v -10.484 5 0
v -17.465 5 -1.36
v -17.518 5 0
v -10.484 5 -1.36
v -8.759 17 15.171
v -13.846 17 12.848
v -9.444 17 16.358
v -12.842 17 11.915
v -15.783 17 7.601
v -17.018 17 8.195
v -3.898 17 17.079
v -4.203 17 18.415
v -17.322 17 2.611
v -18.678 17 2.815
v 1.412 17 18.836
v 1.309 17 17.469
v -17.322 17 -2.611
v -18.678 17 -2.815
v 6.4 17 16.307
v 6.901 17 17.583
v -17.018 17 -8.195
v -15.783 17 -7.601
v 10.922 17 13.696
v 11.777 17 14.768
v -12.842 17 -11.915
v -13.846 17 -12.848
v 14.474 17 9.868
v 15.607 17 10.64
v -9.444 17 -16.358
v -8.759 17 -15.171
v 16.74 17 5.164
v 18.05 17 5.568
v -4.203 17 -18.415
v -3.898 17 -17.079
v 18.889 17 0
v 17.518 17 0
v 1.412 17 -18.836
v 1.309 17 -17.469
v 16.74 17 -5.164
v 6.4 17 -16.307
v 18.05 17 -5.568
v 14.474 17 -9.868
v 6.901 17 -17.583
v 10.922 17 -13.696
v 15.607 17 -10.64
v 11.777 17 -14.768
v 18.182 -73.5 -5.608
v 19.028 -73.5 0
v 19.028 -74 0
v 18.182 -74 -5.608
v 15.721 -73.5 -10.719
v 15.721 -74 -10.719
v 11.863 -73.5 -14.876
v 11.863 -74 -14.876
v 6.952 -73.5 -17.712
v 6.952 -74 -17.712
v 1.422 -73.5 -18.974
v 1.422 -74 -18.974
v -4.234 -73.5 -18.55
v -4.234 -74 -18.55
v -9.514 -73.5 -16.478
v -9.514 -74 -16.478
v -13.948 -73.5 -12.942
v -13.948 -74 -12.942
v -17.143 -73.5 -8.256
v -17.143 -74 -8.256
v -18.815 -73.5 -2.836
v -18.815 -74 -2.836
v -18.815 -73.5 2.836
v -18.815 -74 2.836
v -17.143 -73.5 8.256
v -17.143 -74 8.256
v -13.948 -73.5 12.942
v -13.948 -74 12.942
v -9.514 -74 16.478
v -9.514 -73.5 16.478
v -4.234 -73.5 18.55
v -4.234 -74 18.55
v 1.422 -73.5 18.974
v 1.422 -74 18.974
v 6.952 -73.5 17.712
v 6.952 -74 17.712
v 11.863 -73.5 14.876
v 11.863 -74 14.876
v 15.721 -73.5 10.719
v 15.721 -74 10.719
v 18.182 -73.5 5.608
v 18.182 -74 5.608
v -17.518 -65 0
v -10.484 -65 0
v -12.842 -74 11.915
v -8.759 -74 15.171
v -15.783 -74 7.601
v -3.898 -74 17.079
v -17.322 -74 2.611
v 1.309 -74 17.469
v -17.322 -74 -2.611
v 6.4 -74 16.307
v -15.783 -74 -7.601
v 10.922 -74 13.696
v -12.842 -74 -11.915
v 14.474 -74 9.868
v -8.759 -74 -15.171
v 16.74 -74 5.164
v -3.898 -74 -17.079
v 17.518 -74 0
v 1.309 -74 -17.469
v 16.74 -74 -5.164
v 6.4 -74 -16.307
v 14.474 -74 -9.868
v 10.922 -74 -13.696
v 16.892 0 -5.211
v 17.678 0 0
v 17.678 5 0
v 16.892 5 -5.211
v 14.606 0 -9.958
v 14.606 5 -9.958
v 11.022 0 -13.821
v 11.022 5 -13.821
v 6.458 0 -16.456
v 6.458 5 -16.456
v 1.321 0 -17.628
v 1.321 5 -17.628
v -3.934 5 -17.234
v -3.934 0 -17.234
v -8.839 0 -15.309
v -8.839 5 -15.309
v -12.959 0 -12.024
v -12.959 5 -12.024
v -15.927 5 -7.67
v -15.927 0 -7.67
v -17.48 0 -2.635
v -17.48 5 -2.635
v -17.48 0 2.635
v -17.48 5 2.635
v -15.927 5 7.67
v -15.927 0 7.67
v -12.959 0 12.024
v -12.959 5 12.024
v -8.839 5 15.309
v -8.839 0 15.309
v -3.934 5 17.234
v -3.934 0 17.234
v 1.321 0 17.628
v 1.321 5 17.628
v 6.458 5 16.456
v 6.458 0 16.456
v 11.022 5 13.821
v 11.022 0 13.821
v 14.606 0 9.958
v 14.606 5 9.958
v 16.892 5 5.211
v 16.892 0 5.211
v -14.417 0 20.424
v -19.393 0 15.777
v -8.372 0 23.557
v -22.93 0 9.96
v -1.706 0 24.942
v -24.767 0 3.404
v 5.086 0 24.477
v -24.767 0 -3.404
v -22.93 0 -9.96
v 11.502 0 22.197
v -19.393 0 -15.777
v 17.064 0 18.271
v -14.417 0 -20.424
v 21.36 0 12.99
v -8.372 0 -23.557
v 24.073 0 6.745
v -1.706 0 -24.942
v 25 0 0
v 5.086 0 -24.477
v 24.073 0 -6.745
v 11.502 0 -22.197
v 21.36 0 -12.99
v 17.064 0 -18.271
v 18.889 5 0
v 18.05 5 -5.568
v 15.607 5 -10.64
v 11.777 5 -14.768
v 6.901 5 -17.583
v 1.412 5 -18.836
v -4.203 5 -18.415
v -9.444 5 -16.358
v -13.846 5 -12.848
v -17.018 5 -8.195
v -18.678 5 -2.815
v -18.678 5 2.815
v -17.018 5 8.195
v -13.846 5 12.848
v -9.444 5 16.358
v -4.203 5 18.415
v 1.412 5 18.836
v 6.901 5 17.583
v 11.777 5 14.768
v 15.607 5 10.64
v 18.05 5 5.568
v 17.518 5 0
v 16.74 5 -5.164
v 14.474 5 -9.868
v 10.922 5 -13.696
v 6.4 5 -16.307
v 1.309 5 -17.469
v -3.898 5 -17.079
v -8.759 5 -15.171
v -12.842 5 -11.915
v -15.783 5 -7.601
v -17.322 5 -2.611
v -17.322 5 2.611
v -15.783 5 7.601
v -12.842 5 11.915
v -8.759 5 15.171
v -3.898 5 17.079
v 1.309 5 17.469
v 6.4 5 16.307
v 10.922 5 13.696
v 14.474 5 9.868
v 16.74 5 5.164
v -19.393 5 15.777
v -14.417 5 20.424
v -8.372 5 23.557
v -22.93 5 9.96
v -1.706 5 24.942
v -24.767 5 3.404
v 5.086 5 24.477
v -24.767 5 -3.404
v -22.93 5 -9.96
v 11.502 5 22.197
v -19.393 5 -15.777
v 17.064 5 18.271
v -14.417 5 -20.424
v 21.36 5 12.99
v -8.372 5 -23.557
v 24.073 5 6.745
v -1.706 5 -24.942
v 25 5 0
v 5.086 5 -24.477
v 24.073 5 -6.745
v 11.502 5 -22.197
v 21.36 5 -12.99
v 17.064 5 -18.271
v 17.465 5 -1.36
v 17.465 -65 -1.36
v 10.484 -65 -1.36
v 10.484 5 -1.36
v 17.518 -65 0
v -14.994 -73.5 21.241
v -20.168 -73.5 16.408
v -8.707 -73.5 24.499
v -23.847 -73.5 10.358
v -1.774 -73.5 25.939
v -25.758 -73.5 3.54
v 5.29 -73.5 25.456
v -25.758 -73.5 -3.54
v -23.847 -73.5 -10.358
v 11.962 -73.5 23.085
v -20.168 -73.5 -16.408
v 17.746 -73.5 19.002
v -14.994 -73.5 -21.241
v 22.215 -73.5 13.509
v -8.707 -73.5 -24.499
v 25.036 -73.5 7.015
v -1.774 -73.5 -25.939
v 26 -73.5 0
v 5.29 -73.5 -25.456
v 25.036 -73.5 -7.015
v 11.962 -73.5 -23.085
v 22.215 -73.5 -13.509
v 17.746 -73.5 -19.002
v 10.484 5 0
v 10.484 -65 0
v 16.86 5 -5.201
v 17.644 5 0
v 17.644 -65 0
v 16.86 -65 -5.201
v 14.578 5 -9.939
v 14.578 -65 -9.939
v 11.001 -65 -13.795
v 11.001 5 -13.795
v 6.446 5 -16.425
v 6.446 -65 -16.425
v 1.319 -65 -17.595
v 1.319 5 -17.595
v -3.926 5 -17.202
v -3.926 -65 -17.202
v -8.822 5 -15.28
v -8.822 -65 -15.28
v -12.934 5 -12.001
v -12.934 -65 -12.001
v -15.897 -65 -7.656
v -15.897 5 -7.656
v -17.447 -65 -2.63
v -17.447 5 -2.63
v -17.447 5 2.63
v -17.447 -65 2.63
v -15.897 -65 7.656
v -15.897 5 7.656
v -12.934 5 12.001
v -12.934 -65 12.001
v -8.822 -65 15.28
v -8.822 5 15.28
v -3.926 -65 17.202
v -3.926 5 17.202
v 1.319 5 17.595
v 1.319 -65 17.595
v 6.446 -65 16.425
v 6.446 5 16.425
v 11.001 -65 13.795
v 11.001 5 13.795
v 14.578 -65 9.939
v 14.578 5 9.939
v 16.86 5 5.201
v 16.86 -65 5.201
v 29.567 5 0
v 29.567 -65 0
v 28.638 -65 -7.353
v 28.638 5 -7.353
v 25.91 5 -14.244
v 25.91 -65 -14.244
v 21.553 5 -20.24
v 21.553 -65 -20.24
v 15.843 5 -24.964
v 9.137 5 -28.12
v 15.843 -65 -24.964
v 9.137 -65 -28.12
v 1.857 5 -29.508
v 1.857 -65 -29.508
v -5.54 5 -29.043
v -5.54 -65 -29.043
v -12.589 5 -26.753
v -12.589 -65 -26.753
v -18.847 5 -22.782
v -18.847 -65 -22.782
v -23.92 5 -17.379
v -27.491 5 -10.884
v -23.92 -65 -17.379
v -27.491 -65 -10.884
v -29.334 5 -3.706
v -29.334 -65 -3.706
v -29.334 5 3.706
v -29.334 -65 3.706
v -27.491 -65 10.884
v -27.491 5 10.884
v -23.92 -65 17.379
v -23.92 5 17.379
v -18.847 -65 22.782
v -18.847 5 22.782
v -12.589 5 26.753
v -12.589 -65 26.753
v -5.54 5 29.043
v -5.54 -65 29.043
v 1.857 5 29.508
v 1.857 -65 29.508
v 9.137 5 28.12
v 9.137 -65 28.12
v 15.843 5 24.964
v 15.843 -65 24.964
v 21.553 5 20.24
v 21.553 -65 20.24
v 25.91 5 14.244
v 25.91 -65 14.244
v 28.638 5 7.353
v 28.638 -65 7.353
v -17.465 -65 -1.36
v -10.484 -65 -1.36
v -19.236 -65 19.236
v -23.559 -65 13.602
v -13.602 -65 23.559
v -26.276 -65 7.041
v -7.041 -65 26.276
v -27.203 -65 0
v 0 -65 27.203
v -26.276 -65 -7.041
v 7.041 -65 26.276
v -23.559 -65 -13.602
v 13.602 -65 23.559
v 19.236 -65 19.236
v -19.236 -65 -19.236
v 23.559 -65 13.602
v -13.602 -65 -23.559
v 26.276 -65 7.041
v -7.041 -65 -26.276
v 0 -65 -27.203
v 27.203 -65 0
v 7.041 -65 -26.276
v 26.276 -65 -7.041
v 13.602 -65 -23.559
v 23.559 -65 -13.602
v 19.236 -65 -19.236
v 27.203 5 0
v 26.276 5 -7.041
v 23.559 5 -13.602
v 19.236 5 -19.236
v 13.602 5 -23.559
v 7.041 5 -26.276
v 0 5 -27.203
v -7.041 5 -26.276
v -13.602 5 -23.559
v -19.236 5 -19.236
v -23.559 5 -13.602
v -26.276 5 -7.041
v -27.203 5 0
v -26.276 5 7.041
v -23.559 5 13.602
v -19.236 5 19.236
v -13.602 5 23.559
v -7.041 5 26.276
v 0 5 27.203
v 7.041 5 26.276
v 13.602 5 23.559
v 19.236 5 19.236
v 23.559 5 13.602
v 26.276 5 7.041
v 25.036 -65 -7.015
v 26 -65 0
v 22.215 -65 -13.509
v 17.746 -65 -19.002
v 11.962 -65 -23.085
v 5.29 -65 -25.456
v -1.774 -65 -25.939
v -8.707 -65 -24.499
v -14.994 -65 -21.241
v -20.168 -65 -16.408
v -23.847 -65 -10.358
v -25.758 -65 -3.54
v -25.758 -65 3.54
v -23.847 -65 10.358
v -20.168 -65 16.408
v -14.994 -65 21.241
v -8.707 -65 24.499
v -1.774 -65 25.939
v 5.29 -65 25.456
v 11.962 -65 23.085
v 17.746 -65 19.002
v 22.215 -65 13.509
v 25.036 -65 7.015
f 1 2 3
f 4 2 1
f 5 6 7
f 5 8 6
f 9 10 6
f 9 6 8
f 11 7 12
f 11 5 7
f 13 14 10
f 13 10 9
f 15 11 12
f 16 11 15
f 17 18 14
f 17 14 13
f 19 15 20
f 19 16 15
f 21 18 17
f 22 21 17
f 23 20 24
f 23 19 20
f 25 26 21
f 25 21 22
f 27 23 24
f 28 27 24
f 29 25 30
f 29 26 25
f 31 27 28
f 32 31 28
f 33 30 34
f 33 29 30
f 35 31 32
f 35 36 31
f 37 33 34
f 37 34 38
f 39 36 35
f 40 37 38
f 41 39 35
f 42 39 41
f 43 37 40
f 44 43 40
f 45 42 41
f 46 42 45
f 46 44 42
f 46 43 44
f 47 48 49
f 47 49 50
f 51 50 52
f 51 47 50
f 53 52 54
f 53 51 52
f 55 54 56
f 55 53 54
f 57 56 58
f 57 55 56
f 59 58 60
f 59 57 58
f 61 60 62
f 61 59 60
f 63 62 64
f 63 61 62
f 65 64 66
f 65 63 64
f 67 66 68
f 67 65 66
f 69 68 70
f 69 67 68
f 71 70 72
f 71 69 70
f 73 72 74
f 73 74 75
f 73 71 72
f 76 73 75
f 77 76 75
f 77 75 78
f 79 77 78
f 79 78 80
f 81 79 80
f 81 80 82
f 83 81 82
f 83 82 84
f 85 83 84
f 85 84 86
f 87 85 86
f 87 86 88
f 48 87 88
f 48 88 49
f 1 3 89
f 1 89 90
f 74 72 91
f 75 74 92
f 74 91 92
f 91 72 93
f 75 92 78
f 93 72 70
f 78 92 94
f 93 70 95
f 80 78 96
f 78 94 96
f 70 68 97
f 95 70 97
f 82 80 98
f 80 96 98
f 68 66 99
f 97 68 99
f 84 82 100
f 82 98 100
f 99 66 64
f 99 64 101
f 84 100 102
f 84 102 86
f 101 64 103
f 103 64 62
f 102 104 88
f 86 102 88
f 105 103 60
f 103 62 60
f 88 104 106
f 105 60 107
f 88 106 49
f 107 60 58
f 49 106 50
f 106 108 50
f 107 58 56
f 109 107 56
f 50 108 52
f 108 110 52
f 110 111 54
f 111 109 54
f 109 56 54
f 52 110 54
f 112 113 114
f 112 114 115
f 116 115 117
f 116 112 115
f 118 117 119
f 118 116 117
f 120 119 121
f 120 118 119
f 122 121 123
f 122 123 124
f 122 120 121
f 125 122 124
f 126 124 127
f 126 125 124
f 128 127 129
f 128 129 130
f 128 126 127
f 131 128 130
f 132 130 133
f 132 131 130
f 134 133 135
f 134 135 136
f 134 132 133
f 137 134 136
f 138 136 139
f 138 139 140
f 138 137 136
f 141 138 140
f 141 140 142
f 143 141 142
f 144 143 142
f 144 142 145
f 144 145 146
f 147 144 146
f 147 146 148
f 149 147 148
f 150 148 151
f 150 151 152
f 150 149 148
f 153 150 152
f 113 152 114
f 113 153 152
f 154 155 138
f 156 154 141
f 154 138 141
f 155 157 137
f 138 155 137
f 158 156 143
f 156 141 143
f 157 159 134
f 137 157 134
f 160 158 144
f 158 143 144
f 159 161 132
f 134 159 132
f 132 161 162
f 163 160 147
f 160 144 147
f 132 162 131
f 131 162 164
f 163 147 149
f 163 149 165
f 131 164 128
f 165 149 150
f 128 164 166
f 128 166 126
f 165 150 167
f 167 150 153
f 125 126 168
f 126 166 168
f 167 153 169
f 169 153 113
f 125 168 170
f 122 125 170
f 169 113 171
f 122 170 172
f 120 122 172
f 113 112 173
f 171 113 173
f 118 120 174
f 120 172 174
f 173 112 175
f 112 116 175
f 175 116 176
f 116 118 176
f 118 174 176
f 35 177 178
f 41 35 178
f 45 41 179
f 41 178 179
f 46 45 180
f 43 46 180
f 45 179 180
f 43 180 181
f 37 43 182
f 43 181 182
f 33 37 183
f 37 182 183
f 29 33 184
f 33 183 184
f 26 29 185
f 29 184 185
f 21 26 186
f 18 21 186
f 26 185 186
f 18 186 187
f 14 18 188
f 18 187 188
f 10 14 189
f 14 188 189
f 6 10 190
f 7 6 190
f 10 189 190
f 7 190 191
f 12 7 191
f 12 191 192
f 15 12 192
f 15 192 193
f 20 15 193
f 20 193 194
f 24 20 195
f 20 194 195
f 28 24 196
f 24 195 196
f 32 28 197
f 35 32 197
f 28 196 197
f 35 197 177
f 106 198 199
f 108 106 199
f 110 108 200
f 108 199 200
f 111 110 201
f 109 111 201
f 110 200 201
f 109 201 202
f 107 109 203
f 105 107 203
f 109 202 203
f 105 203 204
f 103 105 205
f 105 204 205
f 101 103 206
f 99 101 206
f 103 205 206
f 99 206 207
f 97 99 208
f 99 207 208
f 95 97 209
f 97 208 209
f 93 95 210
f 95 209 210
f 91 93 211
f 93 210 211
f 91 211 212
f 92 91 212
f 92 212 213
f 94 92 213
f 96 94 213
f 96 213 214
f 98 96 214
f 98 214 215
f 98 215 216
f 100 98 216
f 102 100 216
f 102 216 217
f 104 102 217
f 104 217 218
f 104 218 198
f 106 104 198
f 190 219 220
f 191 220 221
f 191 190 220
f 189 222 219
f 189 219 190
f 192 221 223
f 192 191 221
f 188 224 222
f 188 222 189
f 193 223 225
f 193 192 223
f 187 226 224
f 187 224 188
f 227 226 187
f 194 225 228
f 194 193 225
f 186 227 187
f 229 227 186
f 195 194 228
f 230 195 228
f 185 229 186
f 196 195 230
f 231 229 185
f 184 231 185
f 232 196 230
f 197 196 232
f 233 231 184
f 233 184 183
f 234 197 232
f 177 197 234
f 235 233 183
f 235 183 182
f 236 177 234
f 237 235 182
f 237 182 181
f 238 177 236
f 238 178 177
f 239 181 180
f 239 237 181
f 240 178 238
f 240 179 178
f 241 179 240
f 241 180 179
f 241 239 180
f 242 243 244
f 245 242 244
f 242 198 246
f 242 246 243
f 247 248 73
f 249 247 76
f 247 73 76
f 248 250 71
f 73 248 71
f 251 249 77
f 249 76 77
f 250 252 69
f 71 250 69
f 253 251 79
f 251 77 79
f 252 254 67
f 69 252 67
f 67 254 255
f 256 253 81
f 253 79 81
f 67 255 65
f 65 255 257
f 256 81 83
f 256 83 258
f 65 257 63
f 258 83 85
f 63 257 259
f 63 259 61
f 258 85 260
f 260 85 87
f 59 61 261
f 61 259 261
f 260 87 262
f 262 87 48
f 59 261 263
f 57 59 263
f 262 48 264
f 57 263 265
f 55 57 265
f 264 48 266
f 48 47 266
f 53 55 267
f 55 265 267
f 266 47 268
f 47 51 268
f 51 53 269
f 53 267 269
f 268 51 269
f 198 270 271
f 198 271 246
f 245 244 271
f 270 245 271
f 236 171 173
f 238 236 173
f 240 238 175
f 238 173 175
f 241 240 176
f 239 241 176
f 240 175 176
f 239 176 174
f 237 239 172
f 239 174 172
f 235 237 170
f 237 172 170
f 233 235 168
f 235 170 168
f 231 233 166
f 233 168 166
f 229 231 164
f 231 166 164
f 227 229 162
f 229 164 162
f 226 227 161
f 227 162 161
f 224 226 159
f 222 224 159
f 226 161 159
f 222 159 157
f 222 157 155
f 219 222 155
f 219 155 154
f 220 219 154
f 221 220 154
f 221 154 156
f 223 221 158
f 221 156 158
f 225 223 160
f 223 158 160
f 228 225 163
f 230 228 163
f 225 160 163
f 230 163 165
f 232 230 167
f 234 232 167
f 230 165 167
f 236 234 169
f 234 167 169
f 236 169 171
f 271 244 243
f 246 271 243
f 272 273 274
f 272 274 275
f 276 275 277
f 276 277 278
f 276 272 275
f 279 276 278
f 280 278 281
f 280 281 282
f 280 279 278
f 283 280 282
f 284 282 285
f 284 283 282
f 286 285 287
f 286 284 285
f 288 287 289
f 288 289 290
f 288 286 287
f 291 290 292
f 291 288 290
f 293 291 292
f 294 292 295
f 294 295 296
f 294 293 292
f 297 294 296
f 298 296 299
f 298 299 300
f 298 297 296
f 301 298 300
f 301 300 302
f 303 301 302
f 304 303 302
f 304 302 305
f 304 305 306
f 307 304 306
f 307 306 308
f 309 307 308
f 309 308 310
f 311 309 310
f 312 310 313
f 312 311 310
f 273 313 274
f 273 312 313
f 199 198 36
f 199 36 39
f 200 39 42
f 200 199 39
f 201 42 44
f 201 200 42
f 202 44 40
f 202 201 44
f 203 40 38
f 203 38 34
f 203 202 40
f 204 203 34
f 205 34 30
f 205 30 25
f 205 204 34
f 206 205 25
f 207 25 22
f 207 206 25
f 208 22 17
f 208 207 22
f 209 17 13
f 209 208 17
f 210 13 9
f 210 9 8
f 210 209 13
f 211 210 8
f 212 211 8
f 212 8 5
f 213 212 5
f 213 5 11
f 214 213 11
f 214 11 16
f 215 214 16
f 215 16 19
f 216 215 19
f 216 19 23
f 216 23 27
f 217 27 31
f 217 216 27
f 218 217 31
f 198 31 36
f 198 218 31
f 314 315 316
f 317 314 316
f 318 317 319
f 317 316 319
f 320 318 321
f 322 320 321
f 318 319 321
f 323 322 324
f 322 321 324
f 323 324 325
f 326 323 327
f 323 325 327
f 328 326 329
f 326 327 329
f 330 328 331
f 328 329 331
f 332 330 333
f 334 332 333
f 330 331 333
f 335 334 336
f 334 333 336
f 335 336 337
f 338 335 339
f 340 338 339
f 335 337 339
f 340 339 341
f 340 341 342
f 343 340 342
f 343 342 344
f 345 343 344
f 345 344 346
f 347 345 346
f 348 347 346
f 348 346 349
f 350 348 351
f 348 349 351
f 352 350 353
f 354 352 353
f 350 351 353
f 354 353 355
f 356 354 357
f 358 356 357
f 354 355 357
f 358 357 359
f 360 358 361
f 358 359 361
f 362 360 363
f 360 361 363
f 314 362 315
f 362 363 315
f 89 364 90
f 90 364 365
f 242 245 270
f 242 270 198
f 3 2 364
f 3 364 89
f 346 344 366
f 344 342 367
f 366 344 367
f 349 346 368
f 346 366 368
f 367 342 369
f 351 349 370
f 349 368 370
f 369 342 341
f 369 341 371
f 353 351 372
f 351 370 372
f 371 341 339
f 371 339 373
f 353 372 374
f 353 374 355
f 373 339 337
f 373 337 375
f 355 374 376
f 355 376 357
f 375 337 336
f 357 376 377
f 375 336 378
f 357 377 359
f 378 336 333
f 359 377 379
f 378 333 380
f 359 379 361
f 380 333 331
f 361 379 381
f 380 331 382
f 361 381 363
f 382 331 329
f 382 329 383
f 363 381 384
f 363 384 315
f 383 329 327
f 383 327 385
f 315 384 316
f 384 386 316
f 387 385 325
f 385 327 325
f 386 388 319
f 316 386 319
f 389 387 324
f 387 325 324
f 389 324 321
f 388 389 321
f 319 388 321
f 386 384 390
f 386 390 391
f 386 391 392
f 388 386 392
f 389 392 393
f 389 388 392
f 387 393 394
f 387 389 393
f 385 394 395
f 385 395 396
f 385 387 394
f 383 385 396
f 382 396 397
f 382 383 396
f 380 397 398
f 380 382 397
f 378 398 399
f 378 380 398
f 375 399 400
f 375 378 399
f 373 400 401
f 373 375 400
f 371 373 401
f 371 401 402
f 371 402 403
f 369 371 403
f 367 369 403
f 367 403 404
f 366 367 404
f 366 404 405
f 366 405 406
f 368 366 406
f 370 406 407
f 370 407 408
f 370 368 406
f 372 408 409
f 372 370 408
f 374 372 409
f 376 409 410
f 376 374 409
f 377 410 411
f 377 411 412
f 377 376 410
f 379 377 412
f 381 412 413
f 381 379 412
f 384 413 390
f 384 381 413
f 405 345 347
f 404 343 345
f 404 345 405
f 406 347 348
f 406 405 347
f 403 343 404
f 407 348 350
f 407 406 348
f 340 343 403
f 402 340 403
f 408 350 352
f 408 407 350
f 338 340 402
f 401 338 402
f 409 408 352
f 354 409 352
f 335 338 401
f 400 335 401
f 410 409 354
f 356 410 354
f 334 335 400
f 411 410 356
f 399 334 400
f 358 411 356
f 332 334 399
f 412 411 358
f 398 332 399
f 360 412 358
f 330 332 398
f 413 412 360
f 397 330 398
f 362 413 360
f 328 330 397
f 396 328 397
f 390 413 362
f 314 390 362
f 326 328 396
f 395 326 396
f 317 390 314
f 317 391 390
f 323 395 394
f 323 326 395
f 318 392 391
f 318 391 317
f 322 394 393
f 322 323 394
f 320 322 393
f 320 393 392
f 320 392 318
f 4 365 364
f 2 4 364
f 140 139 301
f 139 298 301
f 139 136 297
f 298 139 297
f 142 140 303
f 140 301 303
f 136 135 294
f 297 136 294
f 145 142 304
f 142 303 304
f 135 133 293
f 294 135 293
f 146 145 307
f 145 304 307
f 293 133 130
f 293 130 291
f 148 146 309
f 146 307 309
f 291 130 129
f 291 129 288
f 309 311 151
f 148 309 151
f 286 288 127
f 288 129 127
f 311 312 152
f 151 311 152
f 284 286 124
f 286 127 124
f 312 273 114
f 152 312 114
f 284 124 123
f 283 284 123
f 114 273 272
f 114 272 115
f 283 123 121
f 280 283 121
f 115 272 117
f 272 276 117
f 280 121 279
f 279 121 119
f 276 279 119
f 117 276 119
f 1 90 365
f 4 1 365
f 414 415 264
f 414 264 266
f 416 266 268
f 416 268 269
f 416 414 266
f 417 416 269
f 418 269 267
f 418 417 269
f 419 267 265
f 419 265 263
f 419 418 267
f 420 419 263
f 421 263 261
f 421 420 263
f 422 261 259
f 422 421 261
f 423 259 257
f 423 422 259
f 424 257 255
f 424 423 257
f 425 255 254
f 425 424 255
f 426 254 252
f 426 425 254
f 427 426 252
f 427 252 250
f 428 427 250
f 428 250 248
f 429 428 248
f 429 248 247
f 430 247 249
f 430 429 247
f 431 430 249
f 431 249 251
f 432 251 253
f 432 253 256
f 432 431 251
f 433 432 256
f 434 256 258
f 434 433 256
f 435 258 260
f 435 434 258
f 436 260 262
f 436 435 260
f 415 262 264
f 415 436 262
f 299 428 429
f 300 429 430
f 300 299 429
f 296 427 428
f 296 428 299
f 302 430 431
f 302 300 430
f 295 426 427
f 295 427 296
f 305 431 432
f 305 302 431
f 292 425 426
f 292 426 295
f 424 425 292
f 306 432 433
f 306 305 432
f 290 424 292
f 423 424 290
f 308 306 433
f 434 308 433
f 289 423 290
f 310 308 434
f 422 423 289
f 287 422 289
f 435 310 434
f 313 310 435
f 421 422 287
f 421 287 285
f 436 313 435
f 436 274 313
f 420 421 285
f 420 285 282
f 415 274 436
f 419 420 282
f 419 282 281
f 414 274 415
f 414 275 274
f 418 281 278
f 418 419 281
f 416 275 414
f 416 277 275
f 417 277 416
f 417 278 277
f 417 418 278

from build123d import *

# Parameters (mm, degrees)
CROQUIS1_R                = 25
CROQUIS1_R_2              = 17.677564449
SALIENTE_EXTRUIR1_DEPTH   = 5
CROQUIS3_R                = 17.644324771
CROQUIS3_R_2              = 17.517960831
SALIENTE_EXTRUIR3_DEPTH   = 70
CROQUIS6_R                = 26
CROQUIS6_R_2              = 17.517960831
SALIENTE_EXTRUIR5_DEPTH   = 8.5
SALIENTE_EXTRUIR6_DEPTH   = 70
SALIENTE_EXTRUIR6_2_DEPTH = 70
CROQUIS8_R                = 19.027539715
CROQUIS8_R_2              = 17.517960831
SALIENTE_EXTRUIR7_DEPTH   = 9
CROQUIS10_R               = 18.888693874
CROQUIS10_R_2             = 17.517960831
SALIENTE_EXTRUIR8_DEPTH   = 12
CROQUIS11_R               = 29.566795097
CROQUIS11_R_2             = 27.203212772
SALIENTE_EXTRUIR9_DEPTH   = 70


with BuildPart() as part:
    # Croquis1 → Saliente-Extruir1 (new body)
    with BuildSketch(Plane(origin=(0, 0, 0), x_dir=(1, 0, 0), z_dir=(0, 1, 0))):
        Circle(CROQUIS1_R)
        Circle(CROQUIS1_R_2, mode=Mode.SUBTRACT)
    extrude(amount=SALIENTE_EXTRUIR1_DEPTH)



with BuildPart() as body_2:
    # Croquis3 → Saliente-Extruir3 (new body)
    with BuildSketch(Plane(origin=(0, 5, 0), x_dir=(1, 0, 0), z_dir=(0, 1, 0))):
        Circle(CROQUIS3_R)
        Circle(CROQUIS3_R_2, mode=Mode.SUBTRACT)
    extrude(amount=-SALIENTE_EXTRUIR3_DEPTH)

    # Croquis6 → Saliente-Extruir5 (add)
    with BuildSketch(Plane(origin=(0, -65, 0), x_dir=(1, 0, 0), z_dir=(0, 1, 0))):
        Circle(CROQUIS6_R)
        Circle(CROQUIS6_R_2, mode=Mode.SUBTRACT)
    extrude(amount=-SALIENTE_EXTRUIR5_DEPTH)

    # Croquis8 → Saliente-Extruir7 (add)
    with BuildSketch(Plane(origin=(0, -65, 0), x_dir=(1, 0, 0), z_dir=(0, 1, 0))):
        Circle(CROQUIS8_R)
        Circle(CROQUIS8_R_2, mode=Mode.SUBTRACT)
    extrude(amount=-SALIENTE_EXTRUIR7_DEPTH)


with BuildPart() as body_3:
    # Croquis7 → Saliente-Extruir6 (new body, through all)
    with BuildSketch(Plane(origin=(0, -65, 0), x_dir=(1, 0, 0), z_dir=(0, 1, 0))):
        Polygon((17.465057261, 1.360414107), (10.484081817, 1.360414107), (10.484081817, 0), (17.517960831, 0), align=None)
    extrude(amount=SALIENTE_EXTRUIR6_DEPTH)


with BuildPart() as body_4:
    # Croquis7 → Saliente-Extruir6 2 (new body, through all)
    with BuildSketch(Plane(origin=(0, -65, 0), x_dir=(1, 0, 0), z_dir=(0, 1, 0))):
        Polygon((-17.517960831, 0), (-10.484081817, 0), (-10.484081817, 1.360414107), (-17.465057261, 1.360414107), align=None)
    extrude(amount=SALIENTE_EXTRUIR6_2_DEPTH)


with BuildPart() as part_1:
    add(part.part)

    add(body_2.part)  # Saliente-Extruir8 merges body 2
    # Croquis10 → Saliente-Extruir8 (add)
    with BuildSketch(Plane(origin=(0, 5, 0), x_dir=(1, 0, 0), z_dir=(0, 1, 0))):
        Circle(CROQUIS10_R)
        Circle(CROQUIS10_R_2, mode=Mode.SUBTRACT)
    extrude(amount=SALIENTE_EXTRUIR8_DEPTH)


with BuildPart() as body_4_2:
    # Croquis11 → Saliente-Extruir9 (new body)
    with BuildSketch(Plane(origin=(0, -65, 0), x_dir=(1, 0, 0), z_dir=(0, 1, 0))):
        Circle(CROQUIS11_R)
        Circle(CROQUIS11_R_2, mode=Mode.SUBTRACT)
    extrude(amount=SALIENTE_EXTRUIR9_DEPTH)


solid = Compound([body_3.part, body_4.part, part_1.part, body_4_2.part])
